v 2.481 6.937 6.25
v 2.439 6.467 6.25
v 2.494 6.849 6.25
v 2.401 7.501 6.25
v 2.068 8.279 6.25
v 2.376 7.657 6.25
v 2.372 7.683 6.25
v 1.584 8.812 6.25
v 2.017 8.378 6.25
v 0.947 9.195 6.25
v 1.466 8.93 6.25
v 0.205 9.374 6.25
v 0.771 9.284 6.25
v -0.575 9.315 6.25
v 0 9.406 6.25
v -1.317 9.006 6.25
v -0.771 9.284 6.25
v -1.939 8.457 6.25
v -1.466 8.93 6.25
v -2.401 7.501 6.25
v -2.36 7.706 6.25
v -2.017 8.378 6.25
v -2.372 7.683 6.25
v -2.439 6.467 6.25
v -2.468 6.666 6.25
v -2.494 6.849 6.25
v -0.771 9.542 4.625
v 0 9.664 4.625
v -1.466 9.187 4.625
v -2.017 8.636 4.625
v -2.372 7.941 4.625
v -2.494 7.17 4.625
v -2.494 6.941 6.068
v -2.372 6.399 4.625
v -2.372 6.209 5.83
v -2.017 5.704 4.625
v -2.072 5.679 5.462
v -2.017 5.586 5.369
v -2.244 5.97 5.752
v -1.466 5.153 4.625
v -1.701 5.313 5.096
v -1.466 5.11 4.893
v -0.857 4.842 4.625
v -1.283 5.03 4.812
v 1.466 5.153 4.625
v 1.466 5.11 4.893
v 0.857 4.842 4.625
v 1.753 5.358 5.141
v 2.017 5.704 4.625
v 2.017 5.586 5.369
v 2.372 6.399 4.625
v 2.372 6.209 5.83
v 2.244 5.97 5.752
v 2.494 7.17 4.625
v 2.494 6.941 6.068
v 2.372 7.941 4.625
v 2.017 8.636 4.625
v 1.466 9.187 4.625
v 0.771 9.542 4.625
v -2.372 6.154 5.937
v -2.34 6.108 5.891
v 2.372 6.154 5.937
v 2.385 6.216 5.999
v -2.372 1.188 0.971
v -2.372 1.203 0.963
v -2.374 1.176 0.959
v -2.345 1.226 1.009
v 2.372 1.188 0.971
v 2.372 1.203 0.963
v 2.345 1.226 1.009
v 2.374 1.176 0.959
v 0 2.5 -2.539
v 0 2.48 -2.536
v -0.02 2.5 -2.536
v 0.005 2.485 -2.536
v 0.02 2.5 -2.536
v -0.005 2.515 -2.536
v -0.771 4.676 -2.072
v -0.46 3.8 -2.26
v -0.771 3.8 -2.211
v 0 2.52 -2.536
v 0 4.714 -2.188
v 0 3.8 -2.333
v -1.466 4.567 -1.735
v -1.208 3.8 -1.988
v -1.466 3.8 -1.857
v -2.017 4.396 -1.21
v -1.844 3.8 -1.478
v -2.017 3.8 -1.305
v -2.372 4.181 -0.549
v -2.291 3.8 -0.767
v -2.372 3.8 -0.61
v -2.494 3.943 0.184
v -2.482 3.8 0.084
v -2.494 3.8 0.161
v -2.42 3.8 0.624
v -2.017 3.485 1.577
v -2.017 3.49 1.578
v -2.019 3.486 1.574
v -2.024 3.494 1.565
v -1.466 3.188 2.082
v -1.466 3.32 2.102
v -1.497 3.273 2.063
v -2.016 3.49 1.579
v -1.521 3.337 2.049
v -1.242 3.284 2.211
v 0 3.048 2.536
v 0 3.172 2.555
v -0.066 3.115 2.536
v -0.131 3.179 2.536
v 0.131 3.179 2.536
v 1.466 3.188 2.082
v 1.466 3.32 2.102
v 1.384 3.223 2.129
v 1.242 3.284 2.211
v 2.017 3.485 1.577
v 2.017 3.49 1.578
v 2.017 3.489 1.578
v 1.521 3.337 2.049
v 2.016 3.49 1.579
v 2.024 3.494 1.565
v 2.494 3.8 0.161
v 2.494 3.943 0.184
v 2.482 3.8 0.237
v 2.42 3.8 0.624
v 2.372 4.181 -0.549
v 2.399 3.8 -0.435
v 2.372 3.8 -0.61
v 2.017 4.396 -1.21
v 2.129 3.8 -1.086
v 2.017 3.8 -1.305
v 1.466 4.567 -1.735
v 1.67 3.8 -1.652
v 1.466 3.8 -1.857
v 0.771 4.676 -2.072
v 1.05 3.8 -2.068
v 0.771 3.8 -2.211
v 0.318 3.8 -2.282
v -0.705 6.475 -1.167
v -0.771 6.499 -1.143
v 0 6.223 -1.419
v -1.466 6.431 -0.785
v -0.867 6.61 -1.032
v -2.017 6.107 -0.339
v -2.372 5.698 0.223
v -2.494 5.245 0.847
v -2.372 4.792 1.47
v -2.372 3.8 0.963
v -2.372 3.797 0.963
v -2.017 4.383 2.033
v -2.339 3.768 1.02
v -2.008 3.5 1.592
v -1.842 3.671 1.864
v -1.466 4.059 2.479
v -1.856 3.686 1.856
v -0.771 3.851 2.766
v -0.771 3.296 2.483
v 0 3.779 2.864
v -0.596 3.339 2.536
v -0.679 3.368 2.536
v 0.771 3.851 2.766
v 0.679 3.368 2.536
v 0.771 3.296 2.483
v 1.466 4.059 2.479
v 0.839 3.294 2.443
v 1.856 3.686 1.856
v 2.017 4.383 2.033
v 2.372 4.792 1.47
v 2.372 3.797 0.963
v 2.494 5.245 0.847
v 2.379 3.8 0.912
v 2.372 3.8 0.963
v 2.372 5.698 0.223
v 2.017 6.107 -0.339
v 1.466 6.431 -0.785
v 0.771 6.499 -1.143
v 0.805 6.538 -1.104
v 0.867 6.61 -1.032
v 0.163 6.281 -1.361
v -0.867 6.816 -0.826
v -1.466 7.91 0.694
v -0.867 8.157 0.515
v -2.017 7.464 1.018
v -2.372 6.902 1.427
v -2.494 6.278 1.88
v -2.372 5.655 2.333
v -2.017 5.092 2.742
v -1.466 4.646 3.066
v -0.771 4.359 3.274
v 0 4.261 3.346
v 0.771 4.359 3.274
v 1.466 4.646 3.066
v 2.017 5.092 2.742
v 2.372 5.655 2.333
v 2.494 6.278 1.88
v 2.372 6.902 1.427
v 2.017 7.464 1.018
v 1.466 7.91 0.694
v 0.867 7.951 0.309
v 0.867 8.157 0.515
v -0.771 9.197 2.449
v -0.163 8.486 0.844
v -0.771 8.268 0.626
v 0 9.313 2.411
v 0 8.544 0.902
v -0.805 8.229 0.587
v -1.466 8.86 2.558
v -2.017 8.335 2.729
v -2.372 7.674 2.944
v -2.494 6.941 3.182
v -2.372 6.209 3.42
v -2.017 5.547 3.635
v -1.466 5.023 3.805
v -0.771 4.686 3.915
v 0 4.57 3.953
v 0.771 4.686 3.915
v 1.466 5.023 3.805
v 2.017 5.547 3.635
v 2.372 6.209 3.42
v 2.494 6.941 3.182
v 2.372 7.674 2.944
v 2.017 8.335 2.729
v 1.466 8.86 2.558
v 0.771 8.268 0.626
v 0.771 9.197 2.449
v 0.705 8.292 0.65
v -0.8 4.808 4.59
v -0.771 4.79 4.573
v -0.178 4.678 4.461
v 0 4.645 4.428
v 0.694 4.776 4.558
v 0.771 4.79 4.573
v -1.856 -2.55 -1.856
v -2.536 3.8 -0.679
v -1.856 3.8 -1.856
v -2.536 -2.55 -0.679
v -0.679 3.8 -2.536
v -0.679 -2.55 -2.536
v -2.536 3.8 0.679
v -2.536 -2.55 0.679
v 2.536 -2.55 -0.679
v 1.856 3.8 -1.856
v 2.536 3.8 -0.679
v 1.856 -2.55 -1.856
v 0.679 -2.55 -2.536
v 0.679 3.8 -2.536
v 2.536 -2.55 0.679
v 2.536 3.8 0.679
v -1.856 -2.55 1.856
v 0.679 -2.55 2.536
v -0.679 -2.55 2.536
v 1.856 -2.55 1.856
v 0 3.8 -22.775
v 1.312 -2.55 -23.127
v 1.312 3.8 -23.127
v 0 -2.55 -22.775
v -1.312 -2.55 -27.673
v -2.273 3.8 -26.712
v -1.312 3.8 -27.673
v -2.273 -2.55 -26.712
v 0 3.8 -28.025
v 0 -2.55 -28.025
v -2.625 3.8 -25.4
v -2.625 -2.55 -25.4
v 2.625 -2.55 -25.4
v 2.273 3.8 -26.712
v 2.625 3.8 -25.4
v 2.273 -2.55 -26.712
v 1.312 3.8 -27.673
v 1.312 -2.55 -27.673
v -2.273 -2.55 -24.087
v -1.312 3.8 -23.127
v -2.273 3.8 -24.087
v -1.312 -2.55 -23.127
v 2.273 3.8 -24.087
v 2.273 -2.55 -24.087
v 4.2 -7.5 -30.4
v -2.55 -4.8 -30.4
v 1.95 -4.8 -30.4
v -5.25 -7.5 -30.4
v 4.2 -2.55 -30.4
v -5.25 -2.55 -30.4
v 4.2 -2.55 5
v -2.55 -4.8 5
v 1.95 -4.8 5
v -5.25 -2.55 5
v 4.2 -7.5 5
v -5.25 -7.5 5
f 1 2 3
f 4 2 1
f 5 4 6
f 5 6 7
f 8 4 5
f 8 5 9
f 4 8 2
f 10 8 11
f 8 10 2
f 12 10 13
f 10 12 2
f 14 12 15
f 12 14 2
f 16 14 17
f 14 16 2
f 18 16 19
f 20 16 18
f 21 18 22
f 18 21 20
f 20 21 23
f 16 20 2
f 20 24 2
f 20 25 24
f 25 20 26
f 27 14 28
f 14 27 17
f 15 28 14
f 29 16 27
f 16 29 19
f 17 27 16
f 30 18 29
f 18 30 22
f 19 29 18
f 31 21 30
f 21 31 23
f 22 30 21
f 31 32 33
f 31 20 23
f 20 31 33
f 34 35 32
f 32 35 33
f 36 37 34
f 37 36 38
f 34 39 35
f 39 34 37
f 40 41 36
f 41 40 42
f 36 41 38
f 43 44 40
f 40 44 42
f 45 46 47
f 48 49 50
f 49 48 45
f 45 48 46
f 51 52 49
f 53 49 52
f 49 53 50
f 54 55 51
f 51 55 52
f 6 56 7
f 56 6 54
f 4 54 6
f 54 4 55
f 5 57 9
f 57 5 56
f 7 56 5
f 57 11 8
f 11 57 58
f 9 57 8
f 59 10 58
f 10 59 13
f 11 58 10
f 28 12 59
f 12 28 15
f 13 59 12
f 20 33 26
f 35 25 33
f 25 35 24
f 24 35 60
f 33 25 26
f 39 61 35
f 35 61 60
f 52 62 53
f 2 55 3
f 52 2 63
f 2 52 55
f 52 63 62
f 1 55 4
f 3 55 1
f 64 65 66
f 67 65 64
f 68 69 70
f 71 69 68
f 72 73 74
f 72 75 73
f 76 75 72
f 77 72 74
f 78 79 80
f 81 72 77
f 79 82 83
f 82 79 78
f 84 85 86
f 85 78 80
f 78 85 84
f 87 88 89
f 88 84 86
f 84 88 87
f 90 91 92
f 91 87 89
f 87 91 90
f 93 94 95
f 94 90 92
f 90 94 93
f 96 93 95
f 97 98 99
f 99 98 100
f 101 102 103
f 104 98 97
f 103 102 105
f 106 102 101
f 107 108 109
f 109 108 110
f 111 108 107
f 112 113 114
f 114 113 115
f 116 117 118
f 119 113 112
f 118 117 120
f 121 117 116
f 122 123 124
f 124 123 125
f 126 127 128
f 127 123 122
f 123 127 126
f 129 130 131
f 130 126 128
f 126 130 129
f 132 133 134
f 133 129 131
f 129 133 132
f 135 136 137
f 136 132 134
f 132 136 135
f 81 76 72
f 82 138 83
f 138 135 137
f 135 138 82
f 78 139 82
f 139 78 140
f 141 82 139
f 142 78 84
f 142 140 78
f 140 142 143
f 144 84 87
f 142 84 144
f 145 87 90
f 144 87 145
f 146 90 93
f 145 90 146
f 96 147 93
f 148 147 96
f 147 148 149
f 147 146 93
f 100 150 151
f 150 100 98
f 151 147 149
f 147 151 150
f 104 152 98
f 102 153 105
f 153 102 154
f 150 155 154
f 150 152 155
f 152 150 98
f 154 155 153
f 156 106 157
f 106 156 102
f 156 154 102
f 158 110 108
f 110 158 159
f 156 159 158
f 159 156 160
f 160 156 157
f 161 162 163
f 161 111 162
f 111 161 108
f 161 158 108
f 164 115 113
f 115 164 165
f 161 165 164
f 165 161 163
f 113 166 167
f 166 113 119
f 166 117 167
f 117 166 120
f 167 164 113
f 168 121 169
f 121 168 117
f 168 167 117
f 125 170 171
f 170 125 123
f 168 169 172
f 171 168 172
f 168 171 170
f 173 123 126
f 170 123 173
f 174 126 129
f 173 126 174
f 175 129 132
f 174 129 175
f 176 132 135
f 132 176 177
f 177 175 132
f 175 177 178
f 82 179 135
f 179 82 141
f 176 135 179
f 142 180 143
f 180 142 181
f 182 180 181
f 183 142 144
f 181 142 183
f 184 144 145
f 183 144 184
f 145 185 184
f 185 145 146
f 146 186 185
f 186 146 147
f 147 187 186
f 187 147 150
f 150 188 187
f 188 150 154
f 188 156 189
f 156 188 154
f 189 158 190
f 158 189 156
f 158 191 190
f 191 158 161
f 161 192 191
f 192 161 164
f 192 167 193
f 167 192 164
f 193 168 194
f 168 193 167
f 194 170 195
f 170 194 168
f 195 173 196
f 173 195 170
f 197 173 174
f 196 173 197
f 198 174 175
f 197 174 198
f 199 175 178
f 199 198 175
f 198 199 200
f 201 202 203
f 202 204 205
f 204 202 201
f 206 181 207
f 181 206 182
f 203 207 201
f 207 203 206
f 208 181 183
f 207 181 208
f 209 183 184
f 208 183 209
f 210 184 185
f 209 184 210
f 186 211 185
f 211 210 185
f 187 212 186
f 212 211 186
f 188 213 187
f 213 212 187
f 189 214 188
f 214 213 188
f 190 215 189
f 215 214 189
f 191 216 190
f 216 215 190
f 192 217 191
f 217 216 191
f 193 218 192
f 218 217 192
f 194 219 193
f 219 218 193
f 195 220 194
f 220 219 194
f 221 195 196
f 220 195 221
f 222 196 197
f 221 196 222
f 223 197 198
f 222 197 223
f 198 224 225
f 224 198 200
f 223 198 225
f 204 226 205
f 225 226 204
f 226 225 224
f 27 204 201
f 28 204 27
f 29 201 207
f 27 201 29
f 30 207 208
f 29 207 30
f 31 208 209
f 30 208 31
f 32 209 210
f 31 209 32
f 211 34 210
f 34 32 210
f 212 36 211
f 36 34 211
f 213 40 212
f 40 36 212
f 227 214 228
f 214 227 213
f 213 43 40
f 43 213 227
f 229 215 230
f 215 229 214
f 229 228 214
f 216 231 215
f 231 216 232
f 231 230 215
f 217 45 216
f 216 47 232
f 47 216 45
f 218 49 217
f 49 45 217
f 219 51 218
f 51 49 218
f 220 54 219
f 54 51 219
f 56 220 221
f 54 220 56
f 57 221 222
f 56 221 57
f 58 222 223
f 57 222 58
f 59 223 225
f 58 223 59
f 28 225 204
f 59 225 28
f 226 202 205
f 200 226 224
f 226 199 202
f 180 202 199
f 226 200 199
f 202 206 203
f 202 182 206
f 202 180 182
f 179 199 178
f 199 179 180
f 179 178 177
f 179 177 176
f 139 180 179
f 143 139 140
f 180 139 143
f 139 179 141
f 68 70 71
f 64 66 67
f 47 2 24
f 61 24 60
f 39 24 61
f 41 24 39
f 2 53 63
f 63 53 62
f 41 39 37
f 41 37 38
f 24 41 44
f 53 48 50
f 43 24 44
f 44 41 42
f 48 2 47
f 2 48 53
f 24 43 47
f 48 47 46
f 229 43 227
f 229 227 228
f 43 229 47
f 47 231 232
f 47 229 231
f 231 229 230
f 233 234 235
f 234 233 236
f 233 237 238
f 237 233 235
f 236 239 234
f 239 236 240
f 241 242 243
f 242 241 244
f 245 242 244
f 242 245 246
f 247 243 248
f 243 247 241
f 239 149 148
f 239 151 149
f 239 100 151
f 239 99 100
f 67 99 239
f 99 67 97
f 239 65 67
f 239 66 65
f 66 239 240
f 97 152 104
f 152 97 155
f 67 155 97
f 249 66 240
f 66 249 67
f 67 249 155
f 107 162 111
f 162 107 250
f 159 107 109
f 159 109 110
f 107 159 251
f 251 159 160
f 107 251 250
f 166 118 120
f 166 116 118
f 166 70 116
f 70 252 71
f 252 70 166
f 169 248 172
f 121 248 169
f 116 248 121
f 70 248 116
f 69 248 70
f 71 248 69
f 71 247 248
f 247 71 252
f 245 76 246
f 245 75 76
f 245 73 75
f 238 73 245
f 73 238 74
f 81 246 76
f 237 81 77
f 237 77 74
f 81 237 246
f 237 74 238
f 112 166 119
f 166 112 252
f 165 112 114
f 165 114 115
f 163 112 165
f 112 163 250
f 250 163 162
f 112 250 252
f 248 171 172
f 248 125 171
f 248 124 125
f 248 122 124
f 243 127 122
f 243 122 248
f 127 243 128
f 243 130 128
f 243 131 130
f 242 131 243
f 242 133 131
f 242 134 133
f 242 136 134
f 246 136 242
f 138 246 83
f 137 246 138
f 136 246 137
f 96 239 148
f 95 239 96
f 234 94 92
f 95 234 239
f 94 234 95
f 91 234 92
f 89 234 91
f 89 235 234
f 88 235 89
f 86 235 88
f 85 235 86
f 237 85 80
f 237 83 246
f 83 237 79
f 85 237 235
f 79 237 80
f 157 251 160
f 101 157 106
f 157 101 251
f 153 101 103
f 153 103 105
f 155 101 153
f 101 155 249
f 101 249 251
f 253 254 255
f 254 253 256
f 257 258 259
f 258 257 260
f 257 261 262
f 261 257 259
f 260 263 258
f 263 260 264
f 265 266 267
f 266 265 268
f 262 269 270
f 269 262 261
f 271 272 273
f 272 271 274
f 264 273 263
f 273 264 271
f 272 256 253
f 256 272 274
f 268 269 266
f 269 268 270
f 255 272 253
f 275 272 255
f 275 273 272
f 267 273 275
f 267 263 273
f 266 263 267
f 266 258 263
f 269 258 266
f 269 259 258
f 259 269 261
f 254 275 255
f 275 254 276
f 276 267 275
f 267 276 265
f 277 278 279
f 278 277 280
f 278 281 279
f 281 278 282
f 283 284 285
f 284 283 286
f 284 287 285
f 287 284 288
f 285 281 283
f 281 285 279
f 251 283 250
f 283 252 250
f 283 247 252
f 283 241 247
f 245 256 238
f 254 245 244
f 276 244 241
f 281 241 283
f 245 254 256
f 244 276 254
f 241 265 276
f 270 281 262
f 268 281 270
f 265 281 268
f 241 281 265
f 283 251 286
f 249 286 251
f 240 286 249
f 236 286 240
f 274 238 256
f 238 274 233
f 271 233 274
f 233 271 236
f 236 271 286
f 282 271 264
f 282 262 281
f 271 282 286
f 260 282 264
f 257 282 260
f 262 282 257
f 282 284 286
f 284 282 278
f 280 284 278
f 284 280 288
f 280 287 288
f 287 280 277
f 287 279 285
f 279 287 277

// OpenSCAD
// file: peg_board_vars.scad
// hole spacing - peg board properties
hole_spacing = 25.4;
// hole size - peg board properties
hole_size = 5.25;
// board thickness - peg board properties
board_thickness = 5;
poly_attach =
    [ [ 0, 0 ], [ 3, 3 ], [ 0, 5.5 ], [ 10.5, 5.5 ], [ 8, 3 ], [ 10.5, 0 ] ];
// main file
include <peg_board_vars.scad>


epsilon = 0.1;
clip_height = 2 * hole_size + 2;

module pin() {
  rotate([ 0, 0, 15 ])
      cylinder(r = hole_size / 2, h = board_thickness * 1.5 + epsilon,
               center = true, $fn = 12);

  rotate([ 0, 0, 90 ]) intersection() {
    translate([ 0, 0, hole_size - epsilon ]) cube(
        [ hole_size + 2 * epsilon, clip_height, 2 * hole_size ], center = true);

    translate([ 0, hole_size / 2 + 2, board_thickness / 2 ])
        rotate([ 0, 90, 0 ]) rotate_extrude(convexity = 5, $fn = 20)
            translate([ 0.44 * hole_size + 2.36, 0, 0 ])
                circle(r = (hole_size * 0.95) / 2);

    translate([ 0, hole_size / 2 + 2 - 1.6, board_thickness / 2 ])
        rotate([ 45, 0, 0 ]) translate([ 0, -0, hole_size * 0.6 ])
            cube([ hole_size + 2 * epsilon, 3 * hole_size, hole_size ],
                 center = true);
  }

  translate([ hole_spacing, 0, 0 ])
      cylinder(r = hole_size / 2, h = board_thickness * 1.5 + epsilon,
               center = true, $fn = 12);
}

module make_peg_attachment() {

  rotate([ -90, 90, 0 ]) pin();

  translate([ -hole_size, -7.5, -hole_spacing - 5 ])
      linear_extrude(height = hole_spacing + 10) scale([ 0.9, 0.9, 0.9 ])
          polygon(points = poly_attach);
}

make_peg_attachment();
